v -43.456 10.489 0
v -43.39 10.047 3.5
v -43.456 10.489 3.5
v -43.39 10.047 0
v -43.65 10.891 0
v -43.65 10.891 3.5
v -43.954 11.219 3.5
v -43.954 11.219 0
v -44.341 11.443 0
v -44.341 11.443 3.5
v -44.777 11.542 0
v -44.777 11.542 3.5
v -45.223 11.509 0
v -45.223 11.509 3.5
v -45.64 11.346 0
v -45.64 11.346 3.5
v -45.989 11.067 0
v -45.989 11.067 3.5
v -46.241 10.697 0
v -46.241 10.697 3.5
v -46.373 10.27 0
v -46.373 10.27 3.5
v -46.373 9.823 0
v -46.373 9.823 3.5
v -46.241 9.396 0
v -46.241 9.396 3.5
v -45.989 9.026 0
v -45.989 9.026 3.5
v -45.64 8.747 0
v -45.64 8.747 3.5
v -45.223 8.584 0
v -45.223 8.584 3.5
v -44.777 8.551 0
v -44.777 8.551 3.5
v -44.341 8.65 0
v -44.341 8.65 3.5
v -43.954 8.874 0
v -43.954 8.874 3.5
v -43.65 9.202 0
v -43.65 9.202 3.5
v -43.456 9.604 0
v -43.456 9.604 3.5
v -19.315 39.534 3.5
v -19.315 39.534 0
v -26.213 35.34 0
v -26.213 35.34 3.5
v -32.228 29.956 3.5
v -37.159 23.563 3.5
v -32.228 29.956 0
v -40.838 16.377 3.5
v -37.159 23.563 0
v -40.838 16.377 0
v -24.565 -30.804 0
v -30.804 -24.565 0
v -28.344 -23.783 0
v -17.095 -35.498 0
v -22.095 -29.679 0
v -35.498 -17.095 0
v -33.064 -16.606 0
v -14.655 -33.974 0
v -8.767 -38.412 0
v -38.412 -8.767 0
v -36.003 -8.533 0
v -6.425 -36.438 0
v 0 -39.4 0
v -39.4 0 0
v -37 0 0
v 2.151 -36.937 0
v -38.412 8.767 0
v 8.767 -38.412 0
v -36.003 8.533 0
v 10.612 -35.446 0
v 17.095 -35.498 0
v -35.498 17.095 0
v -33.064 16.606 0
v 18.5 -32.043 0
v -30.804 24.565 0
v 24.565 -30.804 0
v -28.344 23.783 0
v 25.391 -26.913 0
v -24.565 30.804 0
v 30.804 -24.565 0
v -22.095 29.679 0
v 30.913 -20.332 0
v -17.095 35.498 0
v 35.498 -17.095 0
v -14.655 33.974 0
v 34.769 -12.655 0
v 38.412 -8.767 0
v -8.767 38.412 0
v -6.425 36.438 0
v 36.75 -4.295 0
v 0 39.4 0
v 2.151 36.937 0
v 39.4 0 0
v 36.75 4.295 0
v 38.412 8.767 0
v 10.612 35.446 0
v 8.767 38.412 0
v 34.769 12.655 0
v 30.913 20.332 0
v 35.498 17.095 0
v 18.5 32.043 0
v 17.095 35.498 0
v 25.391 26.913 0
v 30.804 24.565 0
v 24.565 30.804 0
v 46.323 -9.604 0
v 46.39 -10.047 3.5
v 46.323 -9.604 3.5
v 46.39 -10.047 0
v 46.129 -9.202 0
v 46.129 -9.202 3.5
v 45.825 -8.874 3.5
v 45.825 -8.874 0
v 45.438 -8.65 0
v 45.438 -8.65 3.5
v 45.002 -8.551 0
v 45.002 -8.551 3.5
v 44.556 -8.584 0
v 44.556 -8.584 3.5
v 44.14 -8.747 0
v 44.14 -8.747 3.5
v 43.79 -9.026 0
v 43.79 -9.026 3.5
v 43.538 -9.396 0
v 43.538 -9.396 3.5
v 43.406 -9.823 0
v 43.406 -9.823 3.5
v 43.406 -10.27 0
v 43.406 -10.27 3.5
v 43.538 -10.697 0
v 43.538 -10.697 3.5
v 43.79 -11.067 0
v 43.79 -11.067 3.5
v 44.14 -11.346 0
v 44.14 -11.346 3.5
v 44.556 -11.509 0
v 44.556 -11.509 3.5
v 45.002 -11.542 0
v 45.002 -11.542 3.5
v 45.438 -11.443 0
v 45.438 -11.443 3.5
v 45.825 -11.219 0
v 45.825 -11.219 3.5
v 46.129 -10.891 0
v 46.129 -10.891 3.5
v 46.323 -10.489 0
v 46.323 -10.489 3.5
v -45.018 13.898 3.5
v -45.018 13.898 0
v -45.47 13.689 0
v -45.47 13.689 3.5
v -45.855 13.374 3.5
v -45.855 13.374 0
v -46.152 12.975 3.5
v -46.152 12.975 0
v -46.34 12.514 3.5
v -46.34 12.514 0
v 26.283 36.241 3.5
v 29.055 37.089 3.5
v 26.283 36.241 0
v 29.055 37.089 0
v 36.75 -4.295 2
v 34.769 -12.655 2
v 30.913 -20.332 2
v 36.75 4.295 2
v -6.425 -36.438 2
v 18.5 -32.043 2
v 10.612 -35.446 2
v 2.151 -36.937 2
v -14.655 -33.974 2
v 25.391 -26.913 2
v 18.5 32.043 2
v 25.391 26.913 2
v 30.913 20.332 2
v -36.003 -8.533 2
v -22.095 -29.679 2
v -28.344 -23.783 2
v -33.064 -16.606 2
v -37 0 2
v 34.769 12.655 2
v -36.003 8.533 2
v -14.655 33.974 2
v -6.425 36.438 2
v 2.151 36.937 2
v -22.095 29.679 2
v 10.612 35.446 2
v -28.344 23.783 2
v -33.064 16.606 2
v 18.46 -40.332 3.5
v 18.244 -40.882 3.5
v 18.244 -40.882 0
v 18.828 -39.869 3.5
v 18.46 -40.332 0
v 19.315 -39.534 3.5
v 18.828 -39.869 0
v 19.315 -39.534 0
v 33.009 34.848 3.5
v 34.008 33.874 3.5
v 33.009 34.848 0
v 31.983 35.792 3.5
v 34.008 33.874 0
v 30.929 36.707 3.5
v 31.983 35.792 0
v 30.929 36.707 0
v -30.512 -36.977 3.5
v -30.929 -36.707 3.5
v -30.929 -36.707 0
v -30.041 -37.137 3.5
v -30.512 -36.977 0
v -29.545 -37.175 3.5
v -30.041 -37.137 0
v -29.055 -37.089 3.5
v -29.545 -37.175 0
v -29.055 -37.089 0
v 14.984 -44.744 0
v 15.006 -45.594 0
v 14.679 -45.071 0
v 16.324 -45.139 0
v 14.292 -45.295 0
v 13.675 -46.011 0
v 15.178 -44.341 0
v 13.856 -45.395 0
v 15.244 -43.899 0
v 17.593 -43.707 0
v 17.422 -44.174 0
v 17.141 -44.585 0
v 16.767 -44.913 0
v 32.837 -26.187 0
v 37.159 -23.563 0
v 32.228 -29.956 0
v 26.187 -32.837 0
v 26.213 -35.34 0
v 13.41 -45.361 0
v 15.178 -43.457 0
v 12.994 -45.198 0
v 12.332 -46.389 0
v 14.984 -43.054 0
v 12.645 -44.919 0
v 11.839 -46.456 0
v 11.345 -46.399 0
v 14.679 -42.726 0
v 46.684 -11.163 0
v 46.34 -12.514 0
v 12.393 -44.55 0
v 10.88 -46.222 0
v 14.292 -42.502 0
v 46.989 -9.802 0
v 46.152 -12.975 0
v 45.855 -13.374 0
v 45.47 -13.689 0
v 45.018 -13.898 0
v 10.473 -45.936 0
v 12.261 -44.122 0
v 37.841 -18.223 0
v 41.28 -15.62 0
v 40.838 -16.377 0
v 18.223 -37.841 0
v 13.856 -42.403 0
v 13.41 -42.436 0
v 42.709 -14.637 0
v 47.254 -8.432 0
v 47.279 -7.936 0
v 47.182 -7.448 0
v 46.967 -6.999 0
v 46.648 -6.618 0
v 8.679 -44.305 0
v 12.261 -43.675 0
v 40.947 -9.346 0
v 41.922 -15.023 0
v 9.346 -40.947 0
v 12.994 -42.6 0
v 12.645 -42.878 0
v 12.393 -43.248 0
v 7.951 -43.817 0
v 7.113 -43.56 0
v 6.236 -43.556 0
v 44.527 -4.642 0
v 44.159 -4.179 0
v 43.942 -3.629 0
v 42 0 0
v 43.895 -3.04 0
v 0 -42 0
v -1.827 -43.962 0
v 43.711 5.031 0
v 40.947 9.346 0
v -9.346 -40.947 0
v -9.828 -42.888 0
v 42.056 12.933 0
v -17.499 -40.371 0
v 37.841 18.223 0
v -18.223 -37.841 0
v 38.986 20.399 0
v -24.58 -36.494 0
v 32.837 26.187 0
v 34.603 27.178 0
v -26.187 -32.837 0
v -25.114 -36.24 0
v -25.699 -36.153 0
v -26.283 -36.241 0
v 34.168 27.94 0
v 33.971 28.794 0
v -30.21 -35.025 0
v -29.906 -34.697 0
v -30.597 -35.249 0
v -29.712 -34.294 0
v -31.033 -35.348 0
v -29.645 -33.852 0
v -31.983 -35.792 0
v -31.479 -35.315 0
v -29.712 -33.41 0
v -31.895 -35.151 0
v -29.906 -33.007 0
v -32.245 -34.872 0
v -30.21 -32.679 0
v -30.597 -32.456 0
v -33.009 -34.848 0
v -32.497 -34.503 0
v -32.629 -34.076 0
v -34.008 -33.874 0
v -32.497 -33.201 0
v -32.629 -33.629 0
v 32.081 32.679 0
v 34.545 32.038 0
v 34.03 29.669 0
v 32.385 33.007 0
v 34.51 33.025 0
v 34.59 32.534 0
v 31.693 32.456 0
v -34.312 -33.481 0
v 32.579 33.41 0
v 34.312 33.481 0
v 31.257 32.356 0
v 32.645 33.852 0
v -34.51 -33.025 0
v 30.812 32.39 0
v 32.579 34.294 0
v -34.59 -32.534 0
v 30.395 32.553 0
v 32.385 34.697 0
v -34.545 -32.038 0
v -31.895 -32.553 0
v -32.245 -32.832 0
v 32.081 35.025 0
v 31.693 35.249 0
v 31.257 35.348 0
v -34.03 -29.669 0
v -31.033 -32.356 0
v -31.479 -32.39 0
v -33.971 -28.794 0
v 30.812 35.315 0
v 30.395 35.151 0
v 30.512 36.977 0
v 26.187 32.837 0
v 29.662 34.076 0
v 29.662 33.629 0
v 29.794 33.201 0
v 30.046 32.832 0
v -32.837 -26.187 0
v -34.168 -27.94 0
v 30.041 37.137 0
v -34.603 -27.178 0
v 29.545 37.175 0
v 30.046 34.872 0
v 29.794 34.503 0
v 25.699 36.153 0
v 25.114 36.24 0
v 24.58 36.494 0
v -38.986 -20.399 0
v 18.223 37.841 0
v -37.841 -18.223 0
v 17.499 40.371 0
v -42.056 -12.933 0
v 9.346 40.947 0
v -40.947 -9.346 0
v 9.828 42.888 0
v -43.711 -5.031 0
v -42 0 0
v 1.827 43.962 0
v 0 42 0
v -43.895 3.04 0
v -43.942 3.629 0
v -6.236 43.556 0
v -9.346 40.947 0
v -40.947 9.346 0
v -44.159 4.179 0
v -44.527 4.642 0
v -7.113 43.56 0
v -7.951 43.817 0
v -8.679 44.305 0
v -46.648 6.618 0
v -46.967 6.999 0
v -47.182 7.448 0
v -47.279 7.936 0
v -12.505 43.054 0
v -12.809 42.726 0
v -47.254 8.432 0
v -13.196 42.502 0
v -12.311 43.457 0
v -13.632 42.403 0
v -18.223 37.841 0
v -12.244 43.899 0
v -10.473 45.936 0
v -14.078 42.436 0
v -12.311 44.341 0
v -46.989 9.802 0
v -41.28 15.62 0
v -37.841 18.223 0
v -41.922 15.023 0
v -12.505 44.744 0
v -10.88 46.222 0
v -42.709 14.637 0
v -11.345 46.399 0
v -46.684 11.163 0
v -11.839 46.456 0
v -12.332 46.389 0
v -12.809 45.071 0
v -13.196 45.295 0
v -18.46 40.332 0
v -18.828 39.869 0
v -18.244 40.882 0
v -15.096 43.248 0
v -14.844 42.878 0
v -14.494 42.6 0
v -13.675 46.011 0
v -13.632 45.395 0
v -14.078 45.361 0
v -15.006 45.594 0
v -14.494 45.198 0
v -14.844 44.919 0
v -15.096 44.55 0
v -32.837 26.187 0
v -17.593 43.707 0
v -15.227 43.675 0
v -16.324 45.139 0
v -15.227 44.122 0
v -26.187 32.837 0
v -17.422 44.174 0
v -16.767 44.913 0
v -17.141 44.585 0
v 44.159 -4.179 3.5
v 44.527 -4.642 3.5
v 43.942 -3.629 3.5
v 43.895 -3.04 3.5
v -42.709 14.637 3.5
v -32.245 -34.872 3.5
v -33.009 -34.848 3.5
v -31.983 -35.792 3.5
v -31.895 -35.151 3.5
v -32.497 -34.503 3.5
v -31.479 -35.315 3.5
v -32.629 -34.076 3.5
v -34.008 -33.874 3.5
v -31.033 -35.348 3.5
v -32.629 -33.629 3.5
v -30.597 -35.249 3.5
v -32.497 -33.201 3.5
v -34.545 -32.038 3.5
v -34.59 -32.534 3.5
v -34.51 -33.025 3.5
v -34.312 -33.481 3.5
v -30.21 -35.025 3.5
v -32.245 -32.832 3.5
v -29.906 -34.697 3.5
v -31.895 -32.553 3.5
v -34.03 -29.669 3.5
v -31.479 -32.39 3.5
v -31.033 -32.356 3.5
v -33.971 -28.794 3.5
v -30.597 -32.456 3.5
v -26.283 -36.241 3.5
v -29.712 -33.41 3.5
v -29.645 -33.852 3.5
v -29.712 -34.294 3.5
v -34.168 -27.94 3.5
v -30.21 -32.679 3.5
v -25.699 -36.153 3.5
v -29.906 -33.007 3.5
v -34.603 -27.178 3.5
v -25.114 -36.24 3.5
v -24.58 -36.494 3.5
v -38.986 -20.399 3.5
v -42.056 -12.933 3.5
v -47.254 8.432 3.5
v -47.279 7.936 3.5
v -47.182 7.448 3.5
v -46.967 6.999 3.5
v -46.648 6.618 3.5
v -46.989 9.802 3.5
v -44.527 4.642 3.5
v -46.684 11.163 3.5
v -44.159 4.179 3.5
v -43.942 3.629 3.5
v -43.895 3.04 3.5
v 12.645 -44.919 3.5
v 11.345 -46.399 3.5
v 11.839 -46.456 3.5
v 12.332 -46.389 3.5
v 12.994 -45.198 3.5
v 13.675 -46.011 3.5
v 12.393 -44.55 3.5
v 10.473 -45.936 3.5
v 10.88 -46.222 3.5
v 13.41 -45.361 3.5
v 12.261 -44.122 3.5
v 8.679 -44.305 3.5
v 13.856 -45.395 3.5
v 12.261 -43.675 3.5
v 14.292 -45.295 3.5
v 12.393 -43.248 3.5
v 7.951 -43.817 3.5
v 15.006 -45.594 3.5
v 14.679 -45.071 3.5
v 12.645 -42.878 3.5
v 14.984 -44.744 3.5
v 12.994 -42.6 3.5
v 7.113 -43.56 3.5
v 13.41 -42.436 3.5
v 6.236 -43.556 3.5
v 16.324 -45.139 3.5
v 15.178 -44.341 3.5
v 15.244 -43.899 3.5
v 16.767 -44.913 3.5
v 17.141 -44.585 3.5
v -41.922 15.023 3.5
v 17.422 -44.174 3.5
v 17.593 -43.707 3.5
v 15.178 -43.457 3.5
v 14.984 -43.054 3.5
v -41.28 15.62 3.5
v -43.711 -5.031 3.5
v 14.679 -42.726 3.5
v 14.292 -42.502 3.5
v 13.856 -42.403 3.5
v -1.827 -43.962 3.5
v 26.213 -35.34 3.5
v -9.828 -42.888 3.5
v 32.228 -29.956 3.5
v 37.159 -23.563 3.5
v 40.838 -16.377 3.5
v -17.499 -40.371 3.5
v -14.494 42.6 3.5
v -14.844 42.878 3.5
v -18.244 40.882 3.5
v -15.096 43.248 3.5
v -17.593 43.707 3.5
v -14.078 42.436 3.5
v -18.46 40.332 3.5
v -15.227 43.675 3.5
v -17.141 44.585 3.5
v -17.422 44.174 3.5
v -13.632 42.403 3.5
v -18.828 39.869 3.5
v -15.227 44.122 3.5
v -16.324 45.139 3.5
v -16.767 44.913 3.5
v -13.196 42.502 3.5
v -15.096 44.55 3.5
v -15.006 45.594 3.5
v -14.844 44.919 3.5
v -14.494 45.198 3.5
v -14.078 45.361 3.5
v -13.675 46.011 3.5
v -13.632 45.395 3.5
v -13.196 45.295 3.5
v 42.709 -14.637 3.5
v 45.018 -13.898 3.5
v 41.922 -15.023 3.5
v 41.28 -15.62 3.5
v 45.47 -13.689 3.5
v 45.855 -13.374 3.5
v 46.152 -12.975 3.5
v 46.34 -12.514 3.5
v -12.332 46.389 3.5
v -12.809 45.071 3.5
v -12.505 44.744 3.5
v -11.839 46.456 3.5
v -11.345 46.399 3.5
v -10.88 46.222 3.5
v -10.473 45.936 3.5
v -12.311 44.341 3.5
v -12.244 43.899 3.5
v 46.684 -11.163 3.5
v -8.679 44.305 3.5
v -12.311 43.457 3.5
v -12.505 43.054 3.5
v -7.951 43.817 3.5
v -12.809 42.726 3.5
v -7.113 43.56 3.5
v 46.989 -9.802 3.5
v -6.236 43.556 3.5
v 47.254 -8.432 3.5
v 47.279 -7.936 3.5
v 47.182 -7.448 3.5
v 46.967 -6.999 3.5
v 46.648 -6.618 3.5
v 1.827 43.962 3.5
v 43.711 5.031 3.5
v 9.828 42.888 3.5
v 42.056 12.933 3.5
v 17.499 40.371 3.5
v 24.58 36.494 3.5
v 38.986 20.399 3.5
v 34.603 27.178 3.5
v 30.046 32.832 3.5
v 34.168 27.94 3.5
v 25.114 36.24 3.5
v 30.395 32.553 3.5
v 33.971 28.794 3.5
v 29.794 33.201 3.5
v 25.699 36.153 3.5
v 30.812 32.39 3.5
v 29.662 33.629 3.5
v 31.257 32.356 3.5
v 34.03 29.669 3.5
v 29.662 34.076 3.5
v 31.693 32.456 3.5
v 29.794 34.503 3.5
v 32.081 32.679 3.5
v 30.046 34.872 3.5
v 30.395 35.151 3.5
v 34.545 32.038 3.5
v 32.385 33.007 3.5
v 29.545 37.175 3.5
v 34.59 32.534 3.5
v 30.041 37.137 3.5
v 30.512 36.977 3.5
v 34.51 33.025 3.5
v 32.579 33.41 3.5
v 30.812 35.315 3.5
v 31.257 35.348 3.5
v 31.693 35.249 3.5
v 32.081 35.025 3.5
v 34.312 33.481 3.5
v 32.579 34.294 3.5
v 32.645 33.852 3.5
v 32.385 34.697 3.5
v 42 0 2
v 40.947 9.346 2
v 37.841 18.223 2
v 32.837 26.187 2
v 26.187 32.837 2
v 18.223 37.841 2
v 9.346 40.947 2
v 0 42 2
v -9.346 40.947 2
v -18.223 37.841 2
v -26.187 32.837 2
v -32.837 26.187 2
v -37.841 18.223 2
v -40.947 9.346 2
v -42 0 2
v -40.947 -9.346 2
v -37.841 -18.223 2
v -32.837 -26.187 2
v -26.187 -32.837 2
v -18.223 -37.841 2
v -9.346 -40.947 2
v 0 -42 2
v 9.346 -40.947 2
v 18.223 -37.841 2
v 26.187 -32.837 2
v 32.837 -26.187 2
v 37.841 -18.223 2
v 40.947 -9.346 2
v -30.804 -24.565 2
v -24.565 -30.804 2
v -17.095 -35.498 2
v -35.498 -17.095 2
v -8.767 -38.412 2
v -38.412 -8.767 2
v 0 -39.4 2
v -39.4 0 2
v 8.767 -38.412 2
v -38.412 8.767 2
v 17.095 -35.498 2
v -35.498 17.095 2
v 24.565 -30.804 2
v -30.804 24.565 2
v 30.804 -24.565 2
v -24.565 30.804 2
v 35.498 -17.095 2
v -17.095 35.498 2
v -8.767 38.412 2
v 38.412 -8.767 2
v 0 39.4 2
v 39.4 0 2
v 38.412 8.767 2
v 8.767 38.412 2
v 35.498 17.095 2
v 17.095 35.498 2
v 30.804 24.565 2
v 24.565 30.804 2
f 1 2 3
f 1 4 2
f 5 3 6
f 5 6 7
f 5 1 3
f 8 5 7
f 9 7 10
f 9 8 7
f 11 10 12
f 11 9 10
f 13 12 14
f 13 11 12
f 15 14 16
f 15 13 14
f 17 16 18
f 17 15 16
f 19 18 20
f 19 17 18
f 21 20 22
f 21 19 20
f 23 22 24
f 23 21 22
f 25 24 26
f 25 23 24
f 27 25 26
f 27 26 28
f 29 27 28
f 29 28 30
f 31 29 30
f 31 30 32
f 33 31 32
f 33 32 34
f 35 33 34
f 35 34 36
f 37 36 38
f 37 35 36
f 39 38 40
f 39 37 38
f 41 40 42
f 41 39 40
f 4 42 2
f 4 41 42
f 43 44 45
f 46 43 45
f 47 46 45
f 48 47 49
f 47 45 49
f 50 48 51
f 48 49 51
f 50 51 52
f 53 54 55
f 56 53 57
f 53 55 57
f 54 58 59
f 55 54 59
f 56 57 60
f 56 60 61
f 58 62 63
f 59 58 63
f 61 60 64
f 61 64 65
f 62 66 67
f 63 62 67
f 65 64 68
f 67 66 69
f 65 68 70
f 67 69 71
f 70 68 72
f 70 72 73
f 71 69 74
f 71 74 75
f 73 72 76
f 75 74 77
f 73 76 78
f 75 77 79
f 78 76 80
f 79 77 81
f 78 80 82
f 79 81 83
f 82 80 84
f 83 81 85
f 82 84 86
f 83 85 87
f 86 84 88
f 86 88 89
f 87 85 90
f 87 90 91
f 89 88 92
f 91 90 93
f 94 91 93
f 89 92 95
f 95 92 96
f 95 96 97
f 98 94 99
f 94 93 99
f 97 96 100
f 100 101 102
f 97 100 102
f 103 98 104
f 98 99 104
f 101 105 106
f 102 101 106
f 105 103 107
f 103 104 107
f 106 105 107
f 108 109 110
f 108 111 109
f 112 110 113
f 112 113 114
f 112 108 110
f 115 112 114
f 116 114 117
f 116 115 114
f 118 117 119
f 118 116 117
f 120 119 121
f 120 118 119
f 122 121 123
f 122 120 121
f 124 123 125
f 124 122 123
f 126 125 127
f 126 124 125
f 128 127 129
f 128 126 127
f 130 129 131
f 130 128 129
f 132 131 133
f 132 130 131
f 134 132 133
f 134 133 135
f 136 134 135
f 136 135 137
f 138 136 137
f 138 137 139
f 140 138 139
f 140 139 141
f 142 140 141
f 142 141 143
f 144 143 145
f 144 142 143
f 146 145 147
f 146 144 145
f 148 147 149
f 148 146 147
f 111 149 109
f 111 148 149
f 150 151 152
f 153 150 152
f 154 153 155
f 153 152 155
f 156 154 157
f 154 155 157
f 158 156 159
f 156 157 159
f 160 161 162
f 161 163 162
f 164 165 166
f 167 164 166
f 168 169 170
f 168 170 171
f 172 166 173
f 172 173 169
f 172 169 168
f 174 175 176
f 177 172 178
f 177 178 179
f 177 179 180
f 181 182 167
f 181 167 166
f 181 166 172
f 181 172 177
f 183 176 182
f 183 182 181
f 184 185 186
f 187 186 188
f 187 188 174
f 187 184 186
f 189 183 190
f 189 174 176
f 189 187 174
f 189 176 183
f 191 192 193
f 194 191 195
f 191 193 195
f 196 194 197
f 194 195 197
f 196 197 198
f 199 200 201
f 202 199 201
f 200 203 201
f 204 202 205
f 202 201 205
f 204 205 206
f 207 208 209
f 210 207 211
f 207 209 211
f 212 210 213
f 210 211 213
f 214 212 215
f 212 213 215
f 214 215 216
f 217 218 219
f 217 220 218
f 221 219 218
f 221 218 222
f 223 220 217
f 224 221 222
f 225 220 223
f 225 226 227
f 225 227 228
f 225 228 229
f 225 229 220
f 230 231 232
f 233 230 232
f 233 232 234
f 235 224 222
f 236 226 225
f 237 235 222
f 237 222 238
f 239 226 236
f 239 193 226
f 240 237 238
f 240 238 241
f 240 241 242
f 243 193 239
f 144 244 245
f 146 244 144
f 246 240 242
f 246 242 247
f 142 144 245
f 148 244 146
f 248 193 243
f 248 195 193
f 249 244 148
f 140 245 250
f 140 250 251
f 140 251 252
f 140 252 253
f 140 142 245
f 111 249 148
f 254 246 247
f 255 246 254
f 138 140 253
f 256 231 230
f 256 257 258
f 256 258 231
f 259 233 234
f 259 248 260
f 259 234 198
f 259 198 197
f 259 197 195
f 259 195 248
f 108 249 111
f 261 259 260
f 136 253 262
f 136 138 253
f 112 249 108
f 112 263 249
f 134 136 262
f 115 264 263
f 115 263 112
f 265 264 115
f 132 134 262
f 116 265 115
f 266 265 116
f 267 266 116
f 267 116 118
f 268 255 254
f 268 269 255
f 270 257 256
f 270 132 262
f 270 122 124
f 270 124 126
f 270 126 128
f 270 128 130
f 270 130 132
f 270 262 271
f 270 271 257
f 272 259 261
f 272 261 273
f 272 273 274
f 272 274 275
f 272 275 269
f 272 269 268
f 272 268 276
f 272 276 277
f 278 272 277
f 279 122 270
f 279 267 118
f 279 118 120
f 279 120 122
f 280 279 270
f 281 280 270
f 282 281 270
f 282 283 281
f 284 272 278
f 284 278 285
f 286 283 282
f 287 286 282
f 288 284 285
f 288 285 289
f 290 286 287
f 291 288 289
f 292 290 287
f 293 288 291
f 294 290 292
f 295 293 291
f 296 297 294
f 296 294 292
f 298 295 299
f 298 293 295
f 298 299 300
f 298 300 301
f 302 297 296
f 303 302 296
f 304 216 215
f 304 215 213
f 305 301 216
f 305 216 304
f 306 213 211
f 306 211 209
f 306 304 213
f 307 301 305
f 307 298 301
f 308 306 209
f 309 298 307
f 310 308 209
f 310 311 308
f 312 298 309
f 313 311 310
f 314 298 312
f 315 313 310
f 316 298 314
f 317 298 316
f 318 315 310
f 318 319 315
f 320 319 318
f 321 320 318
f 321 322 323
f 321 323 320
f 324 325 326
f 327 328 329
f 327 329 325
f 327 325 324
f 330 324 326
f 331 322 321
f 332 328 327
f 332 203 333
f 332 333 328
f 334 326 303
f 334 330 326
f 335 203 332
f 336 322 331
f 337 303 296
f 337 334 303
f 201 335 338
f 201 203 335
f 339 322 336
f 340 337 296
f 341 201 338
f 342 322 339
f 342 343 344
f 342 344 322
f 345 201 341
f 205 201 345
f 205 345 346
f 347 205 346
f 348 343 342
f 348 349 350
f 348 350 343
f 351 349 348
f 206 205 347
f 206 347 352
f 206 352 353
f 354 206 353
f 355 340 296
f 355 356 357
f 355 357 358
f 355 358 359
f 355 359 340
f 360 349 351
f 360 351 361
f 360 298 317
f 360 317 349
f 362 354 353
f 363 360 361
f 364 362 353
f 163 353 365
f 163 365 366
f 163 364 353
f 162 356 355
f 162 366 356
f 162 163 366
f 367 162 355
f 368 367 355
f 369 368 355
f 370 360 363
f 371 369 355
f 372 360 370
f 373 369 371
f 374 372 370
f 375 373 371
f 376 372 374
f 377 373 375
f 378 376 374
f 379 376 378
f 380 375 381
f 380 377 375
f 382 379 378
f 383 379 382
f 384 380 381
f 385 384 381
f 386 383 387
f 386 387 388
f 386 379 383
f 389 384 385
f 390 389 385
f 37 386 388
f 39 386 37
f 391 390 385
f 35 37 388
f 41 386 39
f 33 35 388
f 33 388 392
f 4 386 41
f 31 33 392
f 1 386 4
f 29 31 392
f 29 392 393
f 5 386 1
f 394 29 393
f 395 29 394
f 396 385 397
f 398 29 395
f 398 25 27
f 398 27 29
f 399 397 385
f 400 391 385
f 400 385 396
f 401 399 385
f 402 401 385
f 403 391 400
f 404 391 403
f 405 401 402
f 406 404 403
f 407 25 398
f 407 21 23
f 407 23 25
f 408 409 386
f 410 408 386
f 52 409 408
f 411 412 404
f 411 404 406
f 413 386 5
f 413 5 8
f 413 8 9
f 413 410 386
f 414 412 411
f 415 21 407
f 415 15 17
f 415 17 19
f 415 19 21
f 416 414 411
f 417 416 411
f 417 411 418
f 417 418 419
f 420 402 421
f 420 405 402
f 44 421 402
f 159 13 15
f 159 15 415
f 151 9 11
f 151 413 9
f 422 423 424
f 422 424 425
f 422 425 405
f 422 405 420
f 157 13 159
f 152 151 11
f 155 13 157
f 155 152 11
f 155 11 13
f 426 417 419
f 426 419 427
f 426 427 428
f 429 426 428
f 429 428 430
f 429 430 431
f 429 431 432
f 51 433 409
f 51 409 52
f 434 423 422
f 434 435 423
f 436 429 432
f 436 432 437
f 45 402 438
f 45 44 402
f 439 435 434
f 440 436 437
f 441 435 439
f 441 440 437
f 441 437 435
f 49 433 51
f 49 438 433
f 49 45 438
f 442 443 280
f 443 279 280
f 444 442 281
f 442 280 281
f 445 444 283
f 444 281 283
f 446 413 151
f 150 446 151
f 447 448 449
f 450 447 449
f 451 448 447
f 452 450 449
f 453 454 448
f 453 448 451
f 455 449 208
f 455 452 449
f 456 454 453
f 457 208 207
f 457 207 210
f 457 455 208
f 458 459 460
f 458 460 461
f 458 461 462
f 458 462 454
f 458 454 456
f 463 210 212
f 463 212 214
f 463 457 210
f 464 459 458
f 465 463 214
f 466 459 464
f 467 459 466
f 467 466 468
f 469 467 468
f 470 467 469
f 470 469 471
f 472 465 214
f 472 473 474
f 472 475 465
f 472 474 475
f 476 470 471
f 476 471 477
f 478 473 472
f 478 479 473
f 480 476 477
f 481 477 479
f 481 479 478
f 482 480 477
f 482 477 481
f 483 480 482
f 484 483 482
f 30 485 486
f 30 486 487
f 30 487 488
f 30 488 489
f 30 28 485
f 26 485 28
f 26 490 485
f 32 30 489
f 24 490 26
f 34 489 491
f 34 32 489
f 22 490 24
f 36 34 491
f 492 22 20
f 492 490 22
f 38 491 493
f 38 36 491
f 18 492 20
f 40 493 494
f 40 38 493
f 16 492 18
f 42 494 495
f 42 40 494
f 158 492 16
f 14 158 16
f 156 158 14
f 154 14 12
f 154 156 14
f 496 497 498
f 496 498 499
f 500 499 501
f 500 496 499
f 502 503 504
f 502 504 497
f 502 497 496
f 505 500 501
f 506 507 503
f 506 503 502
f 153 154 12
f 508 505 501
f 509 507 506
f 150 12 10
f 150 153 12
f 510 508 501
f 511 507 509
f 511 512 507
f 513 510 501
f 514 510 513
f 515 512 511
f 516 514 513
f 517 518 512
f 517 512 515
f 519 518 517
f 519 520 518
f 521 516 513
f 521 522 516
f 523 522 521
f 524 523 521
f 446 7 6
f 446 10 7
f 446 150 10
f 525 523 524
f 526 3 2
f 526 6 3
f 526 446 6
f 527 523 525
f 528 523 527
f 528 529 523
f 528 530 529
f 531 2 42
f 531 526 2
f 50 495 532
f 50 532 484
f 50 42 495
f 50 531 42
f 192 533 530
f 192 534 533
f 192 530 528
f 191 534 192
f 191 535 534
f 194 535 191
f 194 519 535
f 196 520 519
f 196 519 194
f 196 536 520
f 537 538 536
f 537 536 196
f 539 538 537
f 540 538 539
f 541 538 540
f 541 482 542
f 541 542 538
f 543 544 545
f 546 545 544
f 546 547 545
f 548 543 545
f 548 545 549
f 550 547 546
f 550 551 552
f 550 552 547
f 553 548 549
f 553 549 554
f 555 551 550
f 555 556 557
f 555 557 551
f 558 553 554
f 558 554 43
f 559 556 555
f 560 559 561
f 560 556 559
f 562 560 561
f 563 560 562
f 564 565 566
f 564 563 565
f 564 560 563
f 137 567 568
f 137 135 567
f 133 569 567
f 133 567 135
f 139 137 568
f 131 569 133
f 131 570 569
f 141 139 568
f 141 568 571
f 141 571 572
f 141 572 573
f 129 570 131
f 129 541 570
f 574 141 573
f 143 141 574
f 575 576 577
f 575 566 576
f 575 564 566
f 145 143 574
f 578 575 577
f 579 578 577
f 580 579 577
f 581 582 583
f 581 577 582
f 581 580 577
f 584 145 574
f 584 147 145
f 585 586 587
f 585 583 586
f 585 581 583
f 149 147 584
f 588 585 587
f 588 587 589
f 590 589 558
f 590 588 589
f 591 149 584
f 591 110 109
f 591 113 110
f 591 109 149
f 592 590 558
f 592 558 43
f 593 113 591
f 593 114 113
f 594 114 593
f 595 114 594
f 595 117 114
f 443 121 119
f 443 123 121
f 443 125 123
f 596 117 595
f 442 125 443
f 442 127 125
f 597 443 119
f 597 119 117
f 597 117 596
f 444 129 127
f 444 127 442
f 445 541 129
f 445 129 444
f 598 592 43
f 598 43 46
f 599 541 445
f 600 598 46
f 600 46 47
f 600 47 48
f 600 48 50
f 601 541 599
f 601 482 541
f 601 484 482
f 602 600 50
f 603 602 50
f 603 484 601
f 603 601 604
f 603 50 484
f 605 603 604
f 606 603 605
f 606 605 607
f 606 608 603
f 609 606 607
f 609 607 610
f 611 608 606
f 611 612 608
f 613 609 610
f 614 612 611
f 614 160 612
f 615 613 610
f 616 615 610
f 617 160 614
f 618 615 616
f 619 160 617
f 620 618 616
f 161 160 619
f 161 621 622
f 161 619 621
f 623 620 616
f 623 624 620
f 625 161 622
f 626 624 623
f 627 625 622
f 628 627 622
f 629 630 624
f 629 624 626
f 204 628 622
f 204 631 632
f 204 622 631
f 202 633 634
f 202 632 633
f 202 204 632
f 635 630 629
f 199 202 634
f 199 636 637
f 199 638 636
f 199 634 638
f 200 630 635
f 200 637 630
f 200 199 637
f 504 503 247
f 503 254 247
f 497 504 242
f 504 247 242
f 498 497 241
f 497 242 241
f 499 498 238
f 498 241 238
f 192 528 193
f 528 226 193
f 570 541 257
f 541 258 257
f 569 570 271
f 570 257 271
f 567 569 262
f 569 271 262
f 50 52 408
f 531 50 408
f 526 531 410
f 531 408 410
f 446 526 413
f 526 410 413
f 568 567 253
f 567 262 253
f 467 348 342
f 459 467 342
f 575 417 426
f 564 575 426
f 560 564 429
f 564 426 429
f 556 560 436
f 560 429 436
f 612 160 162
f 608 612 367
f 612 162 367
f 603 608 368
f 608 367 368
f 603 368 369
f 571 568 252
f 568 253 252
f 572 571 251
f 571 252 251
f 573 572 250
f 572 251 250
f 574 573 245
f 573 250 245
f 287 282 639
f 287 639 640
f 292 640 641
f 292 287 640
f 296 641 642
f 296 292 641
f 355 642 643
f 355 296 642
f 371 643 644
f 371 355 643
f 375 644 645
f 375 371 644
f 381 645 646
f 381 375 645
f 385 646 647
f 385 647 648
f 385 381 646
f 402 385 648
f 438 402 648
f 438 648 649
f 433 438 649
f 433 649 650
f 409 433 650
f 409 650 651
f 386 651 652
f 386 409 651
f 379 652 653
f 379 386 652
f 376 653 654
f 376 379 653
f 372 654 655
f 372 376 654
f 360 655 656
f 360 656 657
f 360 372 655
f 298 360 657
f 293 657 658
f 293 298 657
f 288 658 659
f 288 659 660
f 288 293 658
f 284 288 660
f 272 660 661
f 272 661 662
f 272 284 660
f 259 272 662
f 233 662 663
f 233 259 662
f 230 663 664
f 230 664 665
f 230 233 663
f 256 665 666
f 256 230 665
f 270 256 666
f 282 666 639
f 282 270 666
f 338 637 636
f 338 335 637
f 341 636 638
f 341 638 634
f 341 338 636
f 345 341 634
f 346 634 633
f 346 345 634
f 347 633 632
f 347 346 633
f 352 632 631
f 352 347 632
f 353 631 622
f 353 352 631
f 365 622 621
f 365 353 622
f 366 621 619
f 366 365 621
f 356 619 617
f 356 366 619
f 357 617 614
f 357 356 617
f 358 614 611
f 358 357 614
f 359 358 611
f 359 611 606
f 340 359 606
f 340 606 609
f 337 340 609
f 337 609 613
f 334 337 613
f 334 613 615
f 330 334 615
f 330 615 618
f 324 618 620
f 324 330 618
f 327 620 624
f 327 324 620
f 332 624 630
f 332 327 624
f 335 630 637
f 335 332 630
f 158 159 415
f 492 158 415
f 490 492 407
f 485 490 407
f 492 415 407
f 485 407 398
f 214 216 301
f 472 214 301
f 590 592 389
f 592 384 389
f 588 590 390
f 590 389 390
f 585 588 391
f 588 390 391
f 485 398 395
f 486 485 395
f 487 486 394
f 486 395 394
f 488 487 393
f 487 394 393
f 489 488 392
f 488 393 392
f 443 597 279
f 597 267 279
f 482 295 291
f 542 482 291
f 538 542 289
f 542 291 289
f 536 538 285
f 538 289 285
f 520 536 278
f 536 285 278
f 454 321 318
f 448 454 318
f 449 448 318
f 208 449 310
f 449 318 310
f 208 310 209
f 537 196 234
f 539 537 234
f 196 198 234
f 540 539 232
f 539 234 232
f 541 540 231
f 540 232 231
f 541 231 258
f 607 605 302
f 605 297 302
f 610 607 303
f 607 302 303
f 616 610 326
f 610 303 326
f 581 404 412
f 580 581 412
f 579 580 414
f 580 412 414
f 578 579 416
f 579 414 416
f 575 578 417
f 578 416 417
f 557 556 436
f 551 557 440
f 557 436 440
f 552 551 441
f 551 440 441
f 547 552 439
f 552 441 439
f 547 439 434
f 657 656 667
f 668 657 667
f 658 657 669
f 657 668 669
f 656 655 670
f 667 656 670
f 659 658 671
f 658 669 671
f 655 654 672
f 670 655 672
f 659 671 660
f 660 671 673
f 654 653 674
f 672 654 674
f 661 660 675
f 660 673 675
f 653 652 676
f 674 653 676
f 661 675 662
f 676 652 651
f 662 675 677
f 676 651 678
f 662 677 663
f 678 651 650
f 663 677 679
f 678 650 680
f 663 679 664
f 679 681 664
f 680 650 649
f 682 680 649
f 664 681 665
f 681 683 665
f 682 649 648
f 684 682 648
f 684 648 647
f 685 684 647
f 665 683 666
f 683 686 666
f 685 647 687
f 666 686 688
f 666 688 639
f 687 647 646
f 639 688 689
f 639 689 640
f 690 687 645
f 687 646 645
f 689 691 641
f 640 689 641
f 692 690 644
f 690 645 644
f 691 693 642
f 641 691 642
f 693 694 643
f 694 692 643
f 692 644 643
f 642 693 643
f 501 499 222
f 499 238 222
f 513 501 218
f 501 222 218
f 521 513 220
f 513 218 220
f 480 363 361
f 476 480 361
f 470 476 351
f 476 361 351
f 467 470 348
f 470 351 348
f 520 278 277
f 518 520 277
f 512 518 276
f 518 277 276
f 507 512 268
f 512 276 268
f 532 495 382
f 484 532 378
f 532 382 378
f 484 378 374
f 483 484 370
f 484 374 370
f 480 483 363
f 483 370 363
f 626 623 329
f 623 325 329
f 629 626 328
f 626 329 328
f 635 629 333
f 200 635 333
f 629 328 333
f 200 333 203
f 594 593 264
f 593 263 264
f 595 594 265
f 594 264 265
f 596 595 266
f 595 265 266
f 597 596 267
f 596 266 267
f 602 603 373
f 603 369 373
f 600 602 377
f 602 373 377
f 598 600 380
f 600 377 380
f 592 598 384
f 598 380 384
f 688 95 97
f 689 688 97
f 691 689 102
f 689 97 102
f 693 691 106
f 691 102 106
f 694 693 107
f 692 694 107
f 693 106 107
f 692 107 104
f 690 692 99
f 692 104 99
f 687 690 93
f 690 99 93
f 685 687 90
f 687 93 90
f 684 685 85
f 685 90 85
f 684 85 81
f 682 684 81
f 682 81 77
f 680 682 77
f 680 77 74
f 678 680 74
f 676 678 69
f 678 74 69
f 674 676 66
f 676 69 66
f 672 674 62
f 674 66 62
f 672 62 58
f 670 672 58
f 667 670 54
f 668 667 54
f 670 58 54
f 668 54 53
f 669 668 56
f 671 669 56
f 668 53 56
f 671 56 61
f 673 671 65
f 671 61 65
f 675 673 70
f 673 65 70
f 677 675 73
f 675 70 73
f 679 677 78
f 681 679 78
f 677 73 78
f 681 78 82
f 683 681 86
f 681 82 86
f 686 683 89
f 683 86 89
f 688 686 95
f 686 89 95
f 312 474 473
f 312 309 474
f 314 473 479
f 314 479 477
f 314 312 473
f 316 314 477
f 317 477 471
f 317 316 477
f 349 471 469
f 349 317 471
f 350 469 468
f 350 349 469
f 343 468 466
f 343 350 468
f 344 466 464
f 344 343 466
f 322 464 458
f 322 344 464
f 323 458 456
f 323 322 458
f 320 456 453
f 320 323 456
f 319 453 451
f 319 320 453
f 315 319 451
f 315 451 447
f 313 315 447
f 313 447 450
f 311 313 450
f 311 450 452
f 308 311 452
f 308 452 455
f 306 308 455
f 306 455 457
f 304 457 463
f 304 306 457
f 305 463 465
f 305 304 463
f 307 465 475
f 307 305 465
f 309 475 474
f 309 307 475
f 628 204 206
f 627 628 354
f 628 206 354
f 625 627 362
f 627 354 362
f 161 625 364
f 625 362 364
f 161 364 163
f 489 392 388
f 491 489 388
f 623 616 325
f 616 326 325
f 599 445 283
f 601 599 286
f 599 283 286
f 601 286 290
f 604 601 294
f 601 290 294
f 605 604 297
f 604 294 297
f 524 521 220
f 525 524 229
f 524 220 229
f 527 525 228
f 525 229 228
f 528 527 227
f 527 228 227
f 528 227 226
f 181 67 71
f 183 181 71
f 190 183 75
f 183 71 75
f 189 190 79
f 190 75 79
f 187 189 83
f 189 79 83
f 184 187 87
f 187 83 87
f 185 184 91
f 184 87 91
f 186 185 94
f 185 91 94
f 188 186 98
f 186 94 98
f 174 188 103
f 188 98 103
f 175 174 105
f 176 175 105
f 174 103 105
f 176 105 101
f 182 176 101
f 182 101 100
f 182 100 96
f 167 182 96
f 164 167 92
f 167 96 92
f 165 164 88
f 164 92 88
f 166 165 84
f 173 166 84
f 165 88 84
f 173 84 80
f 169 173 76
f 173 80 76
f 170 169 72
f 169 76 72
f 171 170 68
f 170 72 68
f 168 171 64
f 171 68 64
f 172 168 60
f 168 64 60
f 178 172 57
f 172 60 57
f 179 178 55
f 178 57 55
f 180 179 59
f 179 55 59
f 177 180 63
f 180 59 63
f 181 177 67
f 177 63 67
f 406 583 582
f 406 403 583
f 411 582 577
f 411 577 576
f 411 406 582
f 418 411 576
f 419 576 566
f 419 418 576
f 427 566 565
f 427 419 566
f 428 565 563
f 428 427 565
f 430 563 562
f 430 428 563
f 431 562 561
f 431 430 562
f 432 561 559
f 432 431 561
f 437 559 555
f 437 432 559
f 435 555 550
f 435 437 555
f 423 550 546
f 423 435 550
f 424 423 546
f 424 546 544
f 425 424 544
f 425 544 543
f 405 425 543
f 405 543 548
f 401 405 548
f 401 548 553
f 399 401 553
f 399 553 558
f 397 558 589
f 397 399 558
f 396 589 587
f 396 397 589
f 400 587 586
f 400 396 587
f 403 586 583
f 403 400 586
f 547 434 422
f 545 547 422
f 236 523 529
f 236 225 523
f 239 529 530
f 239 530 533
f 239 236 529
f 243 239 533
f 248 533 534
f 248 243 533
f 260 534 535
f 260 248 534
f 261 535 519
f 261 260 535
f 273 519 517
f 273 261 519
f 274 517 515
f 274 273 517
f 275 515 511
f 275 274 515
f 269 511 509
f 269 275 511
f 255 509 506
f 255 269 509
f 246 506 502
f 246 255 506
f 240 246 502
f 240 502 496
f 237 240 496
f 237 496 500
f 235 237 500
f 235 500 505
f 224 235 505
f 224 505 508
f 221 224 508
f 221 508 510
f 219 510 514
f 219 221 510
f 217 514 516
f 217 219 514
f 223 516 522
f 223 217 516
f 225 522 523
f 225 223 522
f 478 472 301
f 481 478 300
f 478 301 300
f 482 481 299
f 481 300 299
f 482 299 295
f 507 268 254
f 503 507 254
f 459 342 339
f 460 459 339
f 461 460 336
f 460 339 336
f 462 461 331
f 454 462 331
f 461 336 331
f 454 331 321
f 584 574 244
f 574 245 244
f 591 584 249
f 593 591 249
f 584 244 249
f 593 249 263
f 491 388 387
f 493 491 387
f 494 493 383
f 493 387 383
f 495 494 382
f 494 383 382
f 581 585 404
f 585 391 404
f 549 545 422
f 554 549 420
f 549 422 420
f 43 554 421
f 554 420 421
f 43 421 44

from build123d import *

# Parameters (mm, degrees)
SKETCH2_R             = 39.4
BOSS_EXTRUDE1_DEPTH   = 2
SKETCH2_R_2           = 1.5
SKETCH2_R_3           = 42
BOSS_EXTRUDE1_2_DEPTH = 2
SKETCH3_R             = 1.5
BOSS_EXTRUDE2_DEPTH   = 1.5
SKETCH4_R             = 37
CUT_EXTRUDE1_DEPTH    = 2


with BuildPart() as part:
    # Sketch2 → Boss-Extrude1 (new body)
    with BuildSketch(Plane.XY):
        Circle(SKETCH2_R)
    extrude(amount=BOSS_EXTRUDE1_DEPTH)



with BuildPart() as body_2:
    # Sketch2 → Boss-Extrude1 2 (new body)
    with BuildSketch(Plane.XY):
        with BuildLine():
            Line((-45.018479974, 13.897886094), (-42.708823016, 14.636743864))
            ThreePointArc((-42.708823016, 14.636743864), (-41.579055756, 15.298025015), (-40.838449582, 16.377455105))
            ThreePointArc((-40.838449582, 16.377455105), (-32.228172293, 29.955715826), (-19.314601011, 39.534114228))
            ThreePointArc((-19.314601011, 39.534114228), (-18.626580504, 40.087021781), (-18.243561026, 40.882241915))
            Line((-18.243561026, 40.882241915), (-17.592978184, 43.707000534))
            ThreePointArc((-17.592978184, 43.707000534), (-17.140898521, 44.584509163), (-16.324175781, 45.138910987))
            ThreePointArc((-16.324175781, 45.138910987), (-14.341791733, 45.80734668), (-12.332164177, 46.388767247))
            ThreePointArc((-12.332164177, 46.388767247), (-11.345102668, 46.399111036), (-10.473317571, 45.936090345))
            Line((-10.473317571, 45.936090345), (-8.678619493, 44.30529763))
            ThreePointArc((-8.678619493, 44.30529763), (-7.541049587, 43.657531057), (-6.235932621, 43.555862342))
            ThreePointArc((-6.235932621, 43.555862342), (9.828324748, 42.888273836), (24.580246732, 36.493992253))
            ThreePointArc((24.580246732, 36.493992253), (25.403088973, 36.174602792), (26.283279549, 36.240508262))
            Line((26.283279549, 36.240508262), (29.054883694, 37.089466303))
            ThreePointArc((29.054883694, 37.089466303), (30.04086829, 37.136708144), (30.929355724, 36.706606415))
            ThreePointArc((30.929355724, 36.706606415), (32.499430039, 35.324029316), (34.007768798, 33.874351084))
            ThreePointArc((34.007768798, 33.874351084), (34.510257536, 33.024702637), (34.545162404, 32.03820425))
            Line((34.545162404, 32.03820425), (34.030203523, 29.668553765))
            ThreePointArc((34.030203523, 29.668553765), (34.038006169, 28.359506042), (34.602516962, 27.178407237))
            ThreePointArc((34.602516962, 27.178407237), (42.05649704, 12.93255801), (43.894847743, -3.040121975))
            ThreePointArc((43.894847743, -3.040121975), (44.029669477, -3.912418989), (44.526840575, -4.641733653))
            Line((44.526840575, -4.641733653), (46.647861878, -6.617534232))
            ThreePointArc((46.647861878, -6.617534232), (47.181766811, -7.447801019), (47.253531504, -8.432304572))
            ThreePointArc((47.253531504, -8.432304572), (46.841221772, -10.483317364), (46.339932975, -12.514416163))
            ThreePointArc((46.339932975, -12.514416163), (45.855360204, -13.374408399), (45.018479974, -13.897886094))
            Line((45.018479974, -13.897886094), (42.708823016, -14.636743864))
            ThreePointArc((42.708823016, -14.636743864), (41.579055756, -15.298025015), (40.838449582, -16.377455105))
            ThreePointArc((40.838449582, -16.377455105), (32.228172293, -29.955715826), (19.314601011, -39.534114228))
            ThreePointArc((19.314601011, -39.534114228), (18.626580504, -40.087021781), (18.243561026, -40.882241915))
            Line((18.243561026, -40.882241915), (17.592978184, -43.707000534))
            ThreePointArc((17.592978184, -43.707000534), (17.140898521, -44.584509163), (16.324175781, -45.138910987))
            ThreePointArc((16.324175781, -45.138910987), (14.341791733, -45.80734668), (12.332164177, -46.388767247))
            ThreePointArc((12.332164177, -46.388767247), (11.345102668, -46.399111036), (10.473317571, -45.936090345))
            Line((10.473317571, -45.936090345), (8.678619493, -44.30529763))
            ThreePointArc((8.678619493, -44.30529763), (7.541049587, -43.657531057), (6.235932621, -43.555862342))
            ThreePointArc((6.235932621, -43.555862342), (-9.828324748, -42.888273836), (-24.580246732, -36.493992253))
            ThreePointArc((-24.580246732, -36.493992253), (-25.403088973, -36.174602792), (-26.283279549, -36.240508262))
            Line((-26.283279549, -36.240508262), (-29.054883694, -37.089466303))
            ThreePointArc((-29.054883694, -37.089466303), (-30.04086829, -37.136708144), (-30.929355724, -36.706606415))
            ThreePointArc((-30.929355724, -36.706606415), (-32.499430039, -35.324029316), (-34.007768798, -33.874351084))
            ThreePointArc((-34.007768798, -33.874351084), (-34.510257536, -33.024702637), (-34.545162404, -32.03820425))
            Line((-34.545162404, -32.03820425), (-34.030203523, -29.668553765))
            ThreePointArc((-34.030203523, -29.668553765), (-34.038006169, -28.359506042), (-34.602516962, -27.178407237))
            ThreePointArc((-34.602516962, -27.178407237), (-42.05649704, -12.93255801), (-43.894847743, 3.040121975))
            ThreePointArc((-43.894847743, 3.040121975), (-44.029669477, 3.912418989), (-44.526840575, 4.641733653))
            Line((-44.526840575, 4.641733653), (-46.647861878, 6.617534232))
            ThreePointArc((-46.647861878, 6.617534232), (-47.181766811, 7.447801019), (-47.253531504, 8.432304572))
            ThreePointArc((-47.253531504, 8.432304572), (-46.841221772, 10.483317364), (-46.339932975, 12.514416163))
            ThreePointArc((-46.339932975, 12.514416163), (-45.855360204, 13.374408399), (-45.018479974, 13.897886094))
        make_face()
        with Locations((-13.744217077, 43.898707235)):
            Circle(SKETCH2_R_2, mode=Mode.SUBTRACT)
        with Locations((-44.889504198, 10.046512474)):
            Circle(SKETCH2_R_2, mode=Mode.SUBTRACT)
        with Locations((31.145287121, 33.852194762)):
            Circle(SKETCH2_R_2, mode=Mode.SUBTRACT)
        with Locations((44.889504198, -10.046512474)):
            Circle(SKETCH2_R_2, mode=Mode.SUBTRACT)
        with Locations((13.744217077, -43.898707235)):
            Circle(SKETCH2_R_2, mode=Mode.SUBTRACT)
        with Locations((-31.145287121, -33.852194762)):
            Circle(SKETCH2_R_2, mode=Mode.SUBTRACT)
        Circle(SKETCH2_R_3, mode=Mode.SUBTRACT)
    extrude(amount=BOSS_EXTRUDE1_2_DEPTH)


with BuildPart() as part_1:
    add(part.part)

    add(body_2.part)  # Boss-Extrude2 merges body 2
    # Sketch3 → Boss-Extrude2 (add)
    with BuildSketch(Plane.XY.offset(2)):
        with BuildLine():
            Line((8.678619493, -44.30529763), (10.473317571, -45.936090345))
            ThreePointArc((10.473317571, -45.936090345), (11.345102668, -46.399111036), (12.332164177, -46.388767247))
            ThreePointArc((12.332164177, -46.388767247), (14.341791733, -45.80734668), (16.324175781, -45.138910987))
            ThreePointArc((16.324175781, -45.138910987), (17.140898521, -44.584509163), (17.592978184, -43.707000534))
            Line((17.592978184, -43.707000534), (18.243561026, -40.882241915))
            ThreePointArc((18.243561026, -40.882241915), (18.626580504, -40.087021781), (19.314601011, -39.534114228))
            ThreePointArc((19.314601011, -39.534114228), (32.228172293, -29.955715826), (40.838449582, -16.377455105))
            ThreePointArc((40.838449582, -16.377455105), (41.579055756, -15.298025015), (42.708823016, -14.636743864))
            Line((42.708823016, -14.636743864), (45.018479974, -13.897886094))
            ThreePointArc((45.018479974, -13.897886094), (45.855360204, -13.374408399), (46.339932975, -12.514416163))
            ThreePointArc((46.339932975, -12.514416163), (46.841221772, -10.483317364), (47.253531504, -8.432304572))
            ThreePointArc((47.253531504, -8.432304572), (47.181766811, -7.447801019), (46.647861878, -6.617534232))
            Line((46.647861878, -6.617534232), (44.526840575, -4.641733653))
            ThreePointArc((44.526840575, -4.641733653), (44.029669477, -3.912418989), (43.894847743, -3.040121975))
            ThreePointArc((43.894847743, -3.040121975), (42.05649704, 12.93255801), (34.602516962, 27.178407237))
            ThreePointArc((34.602516962, 27.178407237), (34.038006169, 28.359506042), (34.030203523, 29.668553765))
            Line((34.030203523, 29.668553765), (34.545162404, 32.03820425))
            ThreePointArc((34.545162404, 32.03820425), (34.510257536, 33.024702637), (34.007768798, 33.874351084))
            ThreePointArc((34.007768798, 33.874351084), (32.499430039, 35.324029316), (30.929355724, 36.706606415))
            ThreePointArc((30.929355724, 36.706606415), (30.04086829, 37.136708144), (29.054883694, 37.089466303))
            Line((29.054883694, 37.089466303), (26.283279549, 36.240508262))
            ThreePointArc((26.283279549, 36.240508262), (25.403088973, 36.174602792), (24.580246732, 36.493992253))
            ThreePointArc((24.580246732, 36.493992253), (9.828324748, 42.888273836), (-6.235932621, 43.555862342))
            ThreePointArc((-6.235932621, 43.555862342), (-7.541049587, 43.657531057), (-8.678619493, 44.30529763))
            Line((-8.678619493, 44.30529763), (-10.473317571, 45.936090345))
            ThreePointArc((-10.473317571, 45.936090345), (-11.345102668, 46.399111036), (-12.332164177, 46.388767247))
            ThreePointArc((-12.332164177, 46.388767247), (-14.341791733, 45.80734668), (-16.324175781, 45.138910987))
            ThreePointArc((-16.324175781, 45.138910987), (-17.140898521, 44.584509163), (-17.592978184, 43.707000534))
            Line((-17.592978184, 43.707000534), (-18.243561026, 40.882241915))
            ThreePointArc((-18.243561026, 40.882241915), (-18.626580504, 40.087021781), (-19.314601011, 39.534114228))
            ThreePointArc((-19.314601011, 39.534114228), (-32.228172293, 29.955715826), (-40.838449582, 16.377455105))
            ThreePointArc((-40.838449582, 16.377455105), (-41.579055756, 15.298025015), (-42.708823016, 14.636743864))
            Line((-42.708823016, 14.636743864), (-45.018479974, 13.897886094))
            ThreePointArc((-45.018479974, 13.897886094), (-45.855360204, 13.374408399), (-46.339932975, 12.514416163))
            ThreePointArc((-46.339932975, 12.514416163), (-46.841221772, 10.483317364), (-47.253531504, 8.432304572))
            ThreePointArc((-47.253531504, 8.432304572), (-47.181766811, 7.447801019), (-46.647861878, 6.617534232))
            Line((-46.647861878, 6.617534232), (-44.526840575, 4.641733653))
            ThreePointArc((-44.526840575, 4.641733653), (-44.029669477, 3.912418989), (-43.894847743, 3.040121975))
            ThreePointArc((-43.894847743, 3.040121975), (-42.05649704, -12.93255801), (-34.602516962, -27.178407237))
            ThreePointArc((-34.602516962, -27.178407237), (-34.038006169, -28.359506042), (-34.030203523, -29.668553765))
            Line((-34.030203523, -29.668553765), (-34.545162404, -32.03820425))
            ThreePointArc((-34.545162404, -32.03820425), (-34.510257536, -33.024702637), (-34.007768798, -33.874351084))
            ThreePointArc((-34.007768798, -33.874351084), (-32.499430039, -35.324029316), (-30.929355724, -36.706606415))
            ThreePointArc((-30.929355724, -36.706606415), (-30.04086829, -37.136708144), (-29.054883694, -37.089466303))
            Line((-29.054883694, -37.089466303), (-26.283279549, -36.240508262))
            ThreePointArc((-26.283279549, -36.240508262), (-25.403088973, -36.174602792), (-24.580246732, -36.493992253))
            ThreePointArc((-24.580246732, -36.493992253), (-9.828324748, -42.888273836), (6.235932621, -43.555862342))
            ThreePointArc((6.235932621, -43.555862342), (7.541049587, -43.657531057), (8.678619493, -44.30529763))
        make_face()
        with Locations((-13.744217077, 43.898707235)):
            Circle(SKETCH3_R, mode=Mode.SUBTRACT)
        with Locations((31.145287121, 33.852194762)):
            Circle(SKETCH3_R, mode=Mode.SUBTRACT)
        with Locations((-44.889504198, 10.046512474)):
            Circle(SKETCH3_R, mode=Mode.SUBTRACT)
        with Locations((-31.145287121, -33.852194762)):
            Circle(SKETCH3_R, mode=Mode.SUBTRACT)
        with Locations((13.744217077, -43.898707235)):
            Circle(SKETCH3_R, mode=Mode.SUBTRACT)
        with Locations((44.889504198, -10.046512474)):
            Circle(SKETCH3_R, mode=Mode.SUBTRACT)
    extrude(amount=BOSS_EXTRUDE2_DEPTH)

    # Sketch4 → Cut-Extrude1 (cut)
    with BuildSketch(Plane(origin=(0, 0, 0), x_dir=(-1, 0, 0), z_dir=(0, 0, -1))):
        Circle(SKETCH4_R)
    extrude(amount=-CUT_EXTRUDE1_DEPTH, mode=Mode.SUBTRACT)


solid = part_1.part
